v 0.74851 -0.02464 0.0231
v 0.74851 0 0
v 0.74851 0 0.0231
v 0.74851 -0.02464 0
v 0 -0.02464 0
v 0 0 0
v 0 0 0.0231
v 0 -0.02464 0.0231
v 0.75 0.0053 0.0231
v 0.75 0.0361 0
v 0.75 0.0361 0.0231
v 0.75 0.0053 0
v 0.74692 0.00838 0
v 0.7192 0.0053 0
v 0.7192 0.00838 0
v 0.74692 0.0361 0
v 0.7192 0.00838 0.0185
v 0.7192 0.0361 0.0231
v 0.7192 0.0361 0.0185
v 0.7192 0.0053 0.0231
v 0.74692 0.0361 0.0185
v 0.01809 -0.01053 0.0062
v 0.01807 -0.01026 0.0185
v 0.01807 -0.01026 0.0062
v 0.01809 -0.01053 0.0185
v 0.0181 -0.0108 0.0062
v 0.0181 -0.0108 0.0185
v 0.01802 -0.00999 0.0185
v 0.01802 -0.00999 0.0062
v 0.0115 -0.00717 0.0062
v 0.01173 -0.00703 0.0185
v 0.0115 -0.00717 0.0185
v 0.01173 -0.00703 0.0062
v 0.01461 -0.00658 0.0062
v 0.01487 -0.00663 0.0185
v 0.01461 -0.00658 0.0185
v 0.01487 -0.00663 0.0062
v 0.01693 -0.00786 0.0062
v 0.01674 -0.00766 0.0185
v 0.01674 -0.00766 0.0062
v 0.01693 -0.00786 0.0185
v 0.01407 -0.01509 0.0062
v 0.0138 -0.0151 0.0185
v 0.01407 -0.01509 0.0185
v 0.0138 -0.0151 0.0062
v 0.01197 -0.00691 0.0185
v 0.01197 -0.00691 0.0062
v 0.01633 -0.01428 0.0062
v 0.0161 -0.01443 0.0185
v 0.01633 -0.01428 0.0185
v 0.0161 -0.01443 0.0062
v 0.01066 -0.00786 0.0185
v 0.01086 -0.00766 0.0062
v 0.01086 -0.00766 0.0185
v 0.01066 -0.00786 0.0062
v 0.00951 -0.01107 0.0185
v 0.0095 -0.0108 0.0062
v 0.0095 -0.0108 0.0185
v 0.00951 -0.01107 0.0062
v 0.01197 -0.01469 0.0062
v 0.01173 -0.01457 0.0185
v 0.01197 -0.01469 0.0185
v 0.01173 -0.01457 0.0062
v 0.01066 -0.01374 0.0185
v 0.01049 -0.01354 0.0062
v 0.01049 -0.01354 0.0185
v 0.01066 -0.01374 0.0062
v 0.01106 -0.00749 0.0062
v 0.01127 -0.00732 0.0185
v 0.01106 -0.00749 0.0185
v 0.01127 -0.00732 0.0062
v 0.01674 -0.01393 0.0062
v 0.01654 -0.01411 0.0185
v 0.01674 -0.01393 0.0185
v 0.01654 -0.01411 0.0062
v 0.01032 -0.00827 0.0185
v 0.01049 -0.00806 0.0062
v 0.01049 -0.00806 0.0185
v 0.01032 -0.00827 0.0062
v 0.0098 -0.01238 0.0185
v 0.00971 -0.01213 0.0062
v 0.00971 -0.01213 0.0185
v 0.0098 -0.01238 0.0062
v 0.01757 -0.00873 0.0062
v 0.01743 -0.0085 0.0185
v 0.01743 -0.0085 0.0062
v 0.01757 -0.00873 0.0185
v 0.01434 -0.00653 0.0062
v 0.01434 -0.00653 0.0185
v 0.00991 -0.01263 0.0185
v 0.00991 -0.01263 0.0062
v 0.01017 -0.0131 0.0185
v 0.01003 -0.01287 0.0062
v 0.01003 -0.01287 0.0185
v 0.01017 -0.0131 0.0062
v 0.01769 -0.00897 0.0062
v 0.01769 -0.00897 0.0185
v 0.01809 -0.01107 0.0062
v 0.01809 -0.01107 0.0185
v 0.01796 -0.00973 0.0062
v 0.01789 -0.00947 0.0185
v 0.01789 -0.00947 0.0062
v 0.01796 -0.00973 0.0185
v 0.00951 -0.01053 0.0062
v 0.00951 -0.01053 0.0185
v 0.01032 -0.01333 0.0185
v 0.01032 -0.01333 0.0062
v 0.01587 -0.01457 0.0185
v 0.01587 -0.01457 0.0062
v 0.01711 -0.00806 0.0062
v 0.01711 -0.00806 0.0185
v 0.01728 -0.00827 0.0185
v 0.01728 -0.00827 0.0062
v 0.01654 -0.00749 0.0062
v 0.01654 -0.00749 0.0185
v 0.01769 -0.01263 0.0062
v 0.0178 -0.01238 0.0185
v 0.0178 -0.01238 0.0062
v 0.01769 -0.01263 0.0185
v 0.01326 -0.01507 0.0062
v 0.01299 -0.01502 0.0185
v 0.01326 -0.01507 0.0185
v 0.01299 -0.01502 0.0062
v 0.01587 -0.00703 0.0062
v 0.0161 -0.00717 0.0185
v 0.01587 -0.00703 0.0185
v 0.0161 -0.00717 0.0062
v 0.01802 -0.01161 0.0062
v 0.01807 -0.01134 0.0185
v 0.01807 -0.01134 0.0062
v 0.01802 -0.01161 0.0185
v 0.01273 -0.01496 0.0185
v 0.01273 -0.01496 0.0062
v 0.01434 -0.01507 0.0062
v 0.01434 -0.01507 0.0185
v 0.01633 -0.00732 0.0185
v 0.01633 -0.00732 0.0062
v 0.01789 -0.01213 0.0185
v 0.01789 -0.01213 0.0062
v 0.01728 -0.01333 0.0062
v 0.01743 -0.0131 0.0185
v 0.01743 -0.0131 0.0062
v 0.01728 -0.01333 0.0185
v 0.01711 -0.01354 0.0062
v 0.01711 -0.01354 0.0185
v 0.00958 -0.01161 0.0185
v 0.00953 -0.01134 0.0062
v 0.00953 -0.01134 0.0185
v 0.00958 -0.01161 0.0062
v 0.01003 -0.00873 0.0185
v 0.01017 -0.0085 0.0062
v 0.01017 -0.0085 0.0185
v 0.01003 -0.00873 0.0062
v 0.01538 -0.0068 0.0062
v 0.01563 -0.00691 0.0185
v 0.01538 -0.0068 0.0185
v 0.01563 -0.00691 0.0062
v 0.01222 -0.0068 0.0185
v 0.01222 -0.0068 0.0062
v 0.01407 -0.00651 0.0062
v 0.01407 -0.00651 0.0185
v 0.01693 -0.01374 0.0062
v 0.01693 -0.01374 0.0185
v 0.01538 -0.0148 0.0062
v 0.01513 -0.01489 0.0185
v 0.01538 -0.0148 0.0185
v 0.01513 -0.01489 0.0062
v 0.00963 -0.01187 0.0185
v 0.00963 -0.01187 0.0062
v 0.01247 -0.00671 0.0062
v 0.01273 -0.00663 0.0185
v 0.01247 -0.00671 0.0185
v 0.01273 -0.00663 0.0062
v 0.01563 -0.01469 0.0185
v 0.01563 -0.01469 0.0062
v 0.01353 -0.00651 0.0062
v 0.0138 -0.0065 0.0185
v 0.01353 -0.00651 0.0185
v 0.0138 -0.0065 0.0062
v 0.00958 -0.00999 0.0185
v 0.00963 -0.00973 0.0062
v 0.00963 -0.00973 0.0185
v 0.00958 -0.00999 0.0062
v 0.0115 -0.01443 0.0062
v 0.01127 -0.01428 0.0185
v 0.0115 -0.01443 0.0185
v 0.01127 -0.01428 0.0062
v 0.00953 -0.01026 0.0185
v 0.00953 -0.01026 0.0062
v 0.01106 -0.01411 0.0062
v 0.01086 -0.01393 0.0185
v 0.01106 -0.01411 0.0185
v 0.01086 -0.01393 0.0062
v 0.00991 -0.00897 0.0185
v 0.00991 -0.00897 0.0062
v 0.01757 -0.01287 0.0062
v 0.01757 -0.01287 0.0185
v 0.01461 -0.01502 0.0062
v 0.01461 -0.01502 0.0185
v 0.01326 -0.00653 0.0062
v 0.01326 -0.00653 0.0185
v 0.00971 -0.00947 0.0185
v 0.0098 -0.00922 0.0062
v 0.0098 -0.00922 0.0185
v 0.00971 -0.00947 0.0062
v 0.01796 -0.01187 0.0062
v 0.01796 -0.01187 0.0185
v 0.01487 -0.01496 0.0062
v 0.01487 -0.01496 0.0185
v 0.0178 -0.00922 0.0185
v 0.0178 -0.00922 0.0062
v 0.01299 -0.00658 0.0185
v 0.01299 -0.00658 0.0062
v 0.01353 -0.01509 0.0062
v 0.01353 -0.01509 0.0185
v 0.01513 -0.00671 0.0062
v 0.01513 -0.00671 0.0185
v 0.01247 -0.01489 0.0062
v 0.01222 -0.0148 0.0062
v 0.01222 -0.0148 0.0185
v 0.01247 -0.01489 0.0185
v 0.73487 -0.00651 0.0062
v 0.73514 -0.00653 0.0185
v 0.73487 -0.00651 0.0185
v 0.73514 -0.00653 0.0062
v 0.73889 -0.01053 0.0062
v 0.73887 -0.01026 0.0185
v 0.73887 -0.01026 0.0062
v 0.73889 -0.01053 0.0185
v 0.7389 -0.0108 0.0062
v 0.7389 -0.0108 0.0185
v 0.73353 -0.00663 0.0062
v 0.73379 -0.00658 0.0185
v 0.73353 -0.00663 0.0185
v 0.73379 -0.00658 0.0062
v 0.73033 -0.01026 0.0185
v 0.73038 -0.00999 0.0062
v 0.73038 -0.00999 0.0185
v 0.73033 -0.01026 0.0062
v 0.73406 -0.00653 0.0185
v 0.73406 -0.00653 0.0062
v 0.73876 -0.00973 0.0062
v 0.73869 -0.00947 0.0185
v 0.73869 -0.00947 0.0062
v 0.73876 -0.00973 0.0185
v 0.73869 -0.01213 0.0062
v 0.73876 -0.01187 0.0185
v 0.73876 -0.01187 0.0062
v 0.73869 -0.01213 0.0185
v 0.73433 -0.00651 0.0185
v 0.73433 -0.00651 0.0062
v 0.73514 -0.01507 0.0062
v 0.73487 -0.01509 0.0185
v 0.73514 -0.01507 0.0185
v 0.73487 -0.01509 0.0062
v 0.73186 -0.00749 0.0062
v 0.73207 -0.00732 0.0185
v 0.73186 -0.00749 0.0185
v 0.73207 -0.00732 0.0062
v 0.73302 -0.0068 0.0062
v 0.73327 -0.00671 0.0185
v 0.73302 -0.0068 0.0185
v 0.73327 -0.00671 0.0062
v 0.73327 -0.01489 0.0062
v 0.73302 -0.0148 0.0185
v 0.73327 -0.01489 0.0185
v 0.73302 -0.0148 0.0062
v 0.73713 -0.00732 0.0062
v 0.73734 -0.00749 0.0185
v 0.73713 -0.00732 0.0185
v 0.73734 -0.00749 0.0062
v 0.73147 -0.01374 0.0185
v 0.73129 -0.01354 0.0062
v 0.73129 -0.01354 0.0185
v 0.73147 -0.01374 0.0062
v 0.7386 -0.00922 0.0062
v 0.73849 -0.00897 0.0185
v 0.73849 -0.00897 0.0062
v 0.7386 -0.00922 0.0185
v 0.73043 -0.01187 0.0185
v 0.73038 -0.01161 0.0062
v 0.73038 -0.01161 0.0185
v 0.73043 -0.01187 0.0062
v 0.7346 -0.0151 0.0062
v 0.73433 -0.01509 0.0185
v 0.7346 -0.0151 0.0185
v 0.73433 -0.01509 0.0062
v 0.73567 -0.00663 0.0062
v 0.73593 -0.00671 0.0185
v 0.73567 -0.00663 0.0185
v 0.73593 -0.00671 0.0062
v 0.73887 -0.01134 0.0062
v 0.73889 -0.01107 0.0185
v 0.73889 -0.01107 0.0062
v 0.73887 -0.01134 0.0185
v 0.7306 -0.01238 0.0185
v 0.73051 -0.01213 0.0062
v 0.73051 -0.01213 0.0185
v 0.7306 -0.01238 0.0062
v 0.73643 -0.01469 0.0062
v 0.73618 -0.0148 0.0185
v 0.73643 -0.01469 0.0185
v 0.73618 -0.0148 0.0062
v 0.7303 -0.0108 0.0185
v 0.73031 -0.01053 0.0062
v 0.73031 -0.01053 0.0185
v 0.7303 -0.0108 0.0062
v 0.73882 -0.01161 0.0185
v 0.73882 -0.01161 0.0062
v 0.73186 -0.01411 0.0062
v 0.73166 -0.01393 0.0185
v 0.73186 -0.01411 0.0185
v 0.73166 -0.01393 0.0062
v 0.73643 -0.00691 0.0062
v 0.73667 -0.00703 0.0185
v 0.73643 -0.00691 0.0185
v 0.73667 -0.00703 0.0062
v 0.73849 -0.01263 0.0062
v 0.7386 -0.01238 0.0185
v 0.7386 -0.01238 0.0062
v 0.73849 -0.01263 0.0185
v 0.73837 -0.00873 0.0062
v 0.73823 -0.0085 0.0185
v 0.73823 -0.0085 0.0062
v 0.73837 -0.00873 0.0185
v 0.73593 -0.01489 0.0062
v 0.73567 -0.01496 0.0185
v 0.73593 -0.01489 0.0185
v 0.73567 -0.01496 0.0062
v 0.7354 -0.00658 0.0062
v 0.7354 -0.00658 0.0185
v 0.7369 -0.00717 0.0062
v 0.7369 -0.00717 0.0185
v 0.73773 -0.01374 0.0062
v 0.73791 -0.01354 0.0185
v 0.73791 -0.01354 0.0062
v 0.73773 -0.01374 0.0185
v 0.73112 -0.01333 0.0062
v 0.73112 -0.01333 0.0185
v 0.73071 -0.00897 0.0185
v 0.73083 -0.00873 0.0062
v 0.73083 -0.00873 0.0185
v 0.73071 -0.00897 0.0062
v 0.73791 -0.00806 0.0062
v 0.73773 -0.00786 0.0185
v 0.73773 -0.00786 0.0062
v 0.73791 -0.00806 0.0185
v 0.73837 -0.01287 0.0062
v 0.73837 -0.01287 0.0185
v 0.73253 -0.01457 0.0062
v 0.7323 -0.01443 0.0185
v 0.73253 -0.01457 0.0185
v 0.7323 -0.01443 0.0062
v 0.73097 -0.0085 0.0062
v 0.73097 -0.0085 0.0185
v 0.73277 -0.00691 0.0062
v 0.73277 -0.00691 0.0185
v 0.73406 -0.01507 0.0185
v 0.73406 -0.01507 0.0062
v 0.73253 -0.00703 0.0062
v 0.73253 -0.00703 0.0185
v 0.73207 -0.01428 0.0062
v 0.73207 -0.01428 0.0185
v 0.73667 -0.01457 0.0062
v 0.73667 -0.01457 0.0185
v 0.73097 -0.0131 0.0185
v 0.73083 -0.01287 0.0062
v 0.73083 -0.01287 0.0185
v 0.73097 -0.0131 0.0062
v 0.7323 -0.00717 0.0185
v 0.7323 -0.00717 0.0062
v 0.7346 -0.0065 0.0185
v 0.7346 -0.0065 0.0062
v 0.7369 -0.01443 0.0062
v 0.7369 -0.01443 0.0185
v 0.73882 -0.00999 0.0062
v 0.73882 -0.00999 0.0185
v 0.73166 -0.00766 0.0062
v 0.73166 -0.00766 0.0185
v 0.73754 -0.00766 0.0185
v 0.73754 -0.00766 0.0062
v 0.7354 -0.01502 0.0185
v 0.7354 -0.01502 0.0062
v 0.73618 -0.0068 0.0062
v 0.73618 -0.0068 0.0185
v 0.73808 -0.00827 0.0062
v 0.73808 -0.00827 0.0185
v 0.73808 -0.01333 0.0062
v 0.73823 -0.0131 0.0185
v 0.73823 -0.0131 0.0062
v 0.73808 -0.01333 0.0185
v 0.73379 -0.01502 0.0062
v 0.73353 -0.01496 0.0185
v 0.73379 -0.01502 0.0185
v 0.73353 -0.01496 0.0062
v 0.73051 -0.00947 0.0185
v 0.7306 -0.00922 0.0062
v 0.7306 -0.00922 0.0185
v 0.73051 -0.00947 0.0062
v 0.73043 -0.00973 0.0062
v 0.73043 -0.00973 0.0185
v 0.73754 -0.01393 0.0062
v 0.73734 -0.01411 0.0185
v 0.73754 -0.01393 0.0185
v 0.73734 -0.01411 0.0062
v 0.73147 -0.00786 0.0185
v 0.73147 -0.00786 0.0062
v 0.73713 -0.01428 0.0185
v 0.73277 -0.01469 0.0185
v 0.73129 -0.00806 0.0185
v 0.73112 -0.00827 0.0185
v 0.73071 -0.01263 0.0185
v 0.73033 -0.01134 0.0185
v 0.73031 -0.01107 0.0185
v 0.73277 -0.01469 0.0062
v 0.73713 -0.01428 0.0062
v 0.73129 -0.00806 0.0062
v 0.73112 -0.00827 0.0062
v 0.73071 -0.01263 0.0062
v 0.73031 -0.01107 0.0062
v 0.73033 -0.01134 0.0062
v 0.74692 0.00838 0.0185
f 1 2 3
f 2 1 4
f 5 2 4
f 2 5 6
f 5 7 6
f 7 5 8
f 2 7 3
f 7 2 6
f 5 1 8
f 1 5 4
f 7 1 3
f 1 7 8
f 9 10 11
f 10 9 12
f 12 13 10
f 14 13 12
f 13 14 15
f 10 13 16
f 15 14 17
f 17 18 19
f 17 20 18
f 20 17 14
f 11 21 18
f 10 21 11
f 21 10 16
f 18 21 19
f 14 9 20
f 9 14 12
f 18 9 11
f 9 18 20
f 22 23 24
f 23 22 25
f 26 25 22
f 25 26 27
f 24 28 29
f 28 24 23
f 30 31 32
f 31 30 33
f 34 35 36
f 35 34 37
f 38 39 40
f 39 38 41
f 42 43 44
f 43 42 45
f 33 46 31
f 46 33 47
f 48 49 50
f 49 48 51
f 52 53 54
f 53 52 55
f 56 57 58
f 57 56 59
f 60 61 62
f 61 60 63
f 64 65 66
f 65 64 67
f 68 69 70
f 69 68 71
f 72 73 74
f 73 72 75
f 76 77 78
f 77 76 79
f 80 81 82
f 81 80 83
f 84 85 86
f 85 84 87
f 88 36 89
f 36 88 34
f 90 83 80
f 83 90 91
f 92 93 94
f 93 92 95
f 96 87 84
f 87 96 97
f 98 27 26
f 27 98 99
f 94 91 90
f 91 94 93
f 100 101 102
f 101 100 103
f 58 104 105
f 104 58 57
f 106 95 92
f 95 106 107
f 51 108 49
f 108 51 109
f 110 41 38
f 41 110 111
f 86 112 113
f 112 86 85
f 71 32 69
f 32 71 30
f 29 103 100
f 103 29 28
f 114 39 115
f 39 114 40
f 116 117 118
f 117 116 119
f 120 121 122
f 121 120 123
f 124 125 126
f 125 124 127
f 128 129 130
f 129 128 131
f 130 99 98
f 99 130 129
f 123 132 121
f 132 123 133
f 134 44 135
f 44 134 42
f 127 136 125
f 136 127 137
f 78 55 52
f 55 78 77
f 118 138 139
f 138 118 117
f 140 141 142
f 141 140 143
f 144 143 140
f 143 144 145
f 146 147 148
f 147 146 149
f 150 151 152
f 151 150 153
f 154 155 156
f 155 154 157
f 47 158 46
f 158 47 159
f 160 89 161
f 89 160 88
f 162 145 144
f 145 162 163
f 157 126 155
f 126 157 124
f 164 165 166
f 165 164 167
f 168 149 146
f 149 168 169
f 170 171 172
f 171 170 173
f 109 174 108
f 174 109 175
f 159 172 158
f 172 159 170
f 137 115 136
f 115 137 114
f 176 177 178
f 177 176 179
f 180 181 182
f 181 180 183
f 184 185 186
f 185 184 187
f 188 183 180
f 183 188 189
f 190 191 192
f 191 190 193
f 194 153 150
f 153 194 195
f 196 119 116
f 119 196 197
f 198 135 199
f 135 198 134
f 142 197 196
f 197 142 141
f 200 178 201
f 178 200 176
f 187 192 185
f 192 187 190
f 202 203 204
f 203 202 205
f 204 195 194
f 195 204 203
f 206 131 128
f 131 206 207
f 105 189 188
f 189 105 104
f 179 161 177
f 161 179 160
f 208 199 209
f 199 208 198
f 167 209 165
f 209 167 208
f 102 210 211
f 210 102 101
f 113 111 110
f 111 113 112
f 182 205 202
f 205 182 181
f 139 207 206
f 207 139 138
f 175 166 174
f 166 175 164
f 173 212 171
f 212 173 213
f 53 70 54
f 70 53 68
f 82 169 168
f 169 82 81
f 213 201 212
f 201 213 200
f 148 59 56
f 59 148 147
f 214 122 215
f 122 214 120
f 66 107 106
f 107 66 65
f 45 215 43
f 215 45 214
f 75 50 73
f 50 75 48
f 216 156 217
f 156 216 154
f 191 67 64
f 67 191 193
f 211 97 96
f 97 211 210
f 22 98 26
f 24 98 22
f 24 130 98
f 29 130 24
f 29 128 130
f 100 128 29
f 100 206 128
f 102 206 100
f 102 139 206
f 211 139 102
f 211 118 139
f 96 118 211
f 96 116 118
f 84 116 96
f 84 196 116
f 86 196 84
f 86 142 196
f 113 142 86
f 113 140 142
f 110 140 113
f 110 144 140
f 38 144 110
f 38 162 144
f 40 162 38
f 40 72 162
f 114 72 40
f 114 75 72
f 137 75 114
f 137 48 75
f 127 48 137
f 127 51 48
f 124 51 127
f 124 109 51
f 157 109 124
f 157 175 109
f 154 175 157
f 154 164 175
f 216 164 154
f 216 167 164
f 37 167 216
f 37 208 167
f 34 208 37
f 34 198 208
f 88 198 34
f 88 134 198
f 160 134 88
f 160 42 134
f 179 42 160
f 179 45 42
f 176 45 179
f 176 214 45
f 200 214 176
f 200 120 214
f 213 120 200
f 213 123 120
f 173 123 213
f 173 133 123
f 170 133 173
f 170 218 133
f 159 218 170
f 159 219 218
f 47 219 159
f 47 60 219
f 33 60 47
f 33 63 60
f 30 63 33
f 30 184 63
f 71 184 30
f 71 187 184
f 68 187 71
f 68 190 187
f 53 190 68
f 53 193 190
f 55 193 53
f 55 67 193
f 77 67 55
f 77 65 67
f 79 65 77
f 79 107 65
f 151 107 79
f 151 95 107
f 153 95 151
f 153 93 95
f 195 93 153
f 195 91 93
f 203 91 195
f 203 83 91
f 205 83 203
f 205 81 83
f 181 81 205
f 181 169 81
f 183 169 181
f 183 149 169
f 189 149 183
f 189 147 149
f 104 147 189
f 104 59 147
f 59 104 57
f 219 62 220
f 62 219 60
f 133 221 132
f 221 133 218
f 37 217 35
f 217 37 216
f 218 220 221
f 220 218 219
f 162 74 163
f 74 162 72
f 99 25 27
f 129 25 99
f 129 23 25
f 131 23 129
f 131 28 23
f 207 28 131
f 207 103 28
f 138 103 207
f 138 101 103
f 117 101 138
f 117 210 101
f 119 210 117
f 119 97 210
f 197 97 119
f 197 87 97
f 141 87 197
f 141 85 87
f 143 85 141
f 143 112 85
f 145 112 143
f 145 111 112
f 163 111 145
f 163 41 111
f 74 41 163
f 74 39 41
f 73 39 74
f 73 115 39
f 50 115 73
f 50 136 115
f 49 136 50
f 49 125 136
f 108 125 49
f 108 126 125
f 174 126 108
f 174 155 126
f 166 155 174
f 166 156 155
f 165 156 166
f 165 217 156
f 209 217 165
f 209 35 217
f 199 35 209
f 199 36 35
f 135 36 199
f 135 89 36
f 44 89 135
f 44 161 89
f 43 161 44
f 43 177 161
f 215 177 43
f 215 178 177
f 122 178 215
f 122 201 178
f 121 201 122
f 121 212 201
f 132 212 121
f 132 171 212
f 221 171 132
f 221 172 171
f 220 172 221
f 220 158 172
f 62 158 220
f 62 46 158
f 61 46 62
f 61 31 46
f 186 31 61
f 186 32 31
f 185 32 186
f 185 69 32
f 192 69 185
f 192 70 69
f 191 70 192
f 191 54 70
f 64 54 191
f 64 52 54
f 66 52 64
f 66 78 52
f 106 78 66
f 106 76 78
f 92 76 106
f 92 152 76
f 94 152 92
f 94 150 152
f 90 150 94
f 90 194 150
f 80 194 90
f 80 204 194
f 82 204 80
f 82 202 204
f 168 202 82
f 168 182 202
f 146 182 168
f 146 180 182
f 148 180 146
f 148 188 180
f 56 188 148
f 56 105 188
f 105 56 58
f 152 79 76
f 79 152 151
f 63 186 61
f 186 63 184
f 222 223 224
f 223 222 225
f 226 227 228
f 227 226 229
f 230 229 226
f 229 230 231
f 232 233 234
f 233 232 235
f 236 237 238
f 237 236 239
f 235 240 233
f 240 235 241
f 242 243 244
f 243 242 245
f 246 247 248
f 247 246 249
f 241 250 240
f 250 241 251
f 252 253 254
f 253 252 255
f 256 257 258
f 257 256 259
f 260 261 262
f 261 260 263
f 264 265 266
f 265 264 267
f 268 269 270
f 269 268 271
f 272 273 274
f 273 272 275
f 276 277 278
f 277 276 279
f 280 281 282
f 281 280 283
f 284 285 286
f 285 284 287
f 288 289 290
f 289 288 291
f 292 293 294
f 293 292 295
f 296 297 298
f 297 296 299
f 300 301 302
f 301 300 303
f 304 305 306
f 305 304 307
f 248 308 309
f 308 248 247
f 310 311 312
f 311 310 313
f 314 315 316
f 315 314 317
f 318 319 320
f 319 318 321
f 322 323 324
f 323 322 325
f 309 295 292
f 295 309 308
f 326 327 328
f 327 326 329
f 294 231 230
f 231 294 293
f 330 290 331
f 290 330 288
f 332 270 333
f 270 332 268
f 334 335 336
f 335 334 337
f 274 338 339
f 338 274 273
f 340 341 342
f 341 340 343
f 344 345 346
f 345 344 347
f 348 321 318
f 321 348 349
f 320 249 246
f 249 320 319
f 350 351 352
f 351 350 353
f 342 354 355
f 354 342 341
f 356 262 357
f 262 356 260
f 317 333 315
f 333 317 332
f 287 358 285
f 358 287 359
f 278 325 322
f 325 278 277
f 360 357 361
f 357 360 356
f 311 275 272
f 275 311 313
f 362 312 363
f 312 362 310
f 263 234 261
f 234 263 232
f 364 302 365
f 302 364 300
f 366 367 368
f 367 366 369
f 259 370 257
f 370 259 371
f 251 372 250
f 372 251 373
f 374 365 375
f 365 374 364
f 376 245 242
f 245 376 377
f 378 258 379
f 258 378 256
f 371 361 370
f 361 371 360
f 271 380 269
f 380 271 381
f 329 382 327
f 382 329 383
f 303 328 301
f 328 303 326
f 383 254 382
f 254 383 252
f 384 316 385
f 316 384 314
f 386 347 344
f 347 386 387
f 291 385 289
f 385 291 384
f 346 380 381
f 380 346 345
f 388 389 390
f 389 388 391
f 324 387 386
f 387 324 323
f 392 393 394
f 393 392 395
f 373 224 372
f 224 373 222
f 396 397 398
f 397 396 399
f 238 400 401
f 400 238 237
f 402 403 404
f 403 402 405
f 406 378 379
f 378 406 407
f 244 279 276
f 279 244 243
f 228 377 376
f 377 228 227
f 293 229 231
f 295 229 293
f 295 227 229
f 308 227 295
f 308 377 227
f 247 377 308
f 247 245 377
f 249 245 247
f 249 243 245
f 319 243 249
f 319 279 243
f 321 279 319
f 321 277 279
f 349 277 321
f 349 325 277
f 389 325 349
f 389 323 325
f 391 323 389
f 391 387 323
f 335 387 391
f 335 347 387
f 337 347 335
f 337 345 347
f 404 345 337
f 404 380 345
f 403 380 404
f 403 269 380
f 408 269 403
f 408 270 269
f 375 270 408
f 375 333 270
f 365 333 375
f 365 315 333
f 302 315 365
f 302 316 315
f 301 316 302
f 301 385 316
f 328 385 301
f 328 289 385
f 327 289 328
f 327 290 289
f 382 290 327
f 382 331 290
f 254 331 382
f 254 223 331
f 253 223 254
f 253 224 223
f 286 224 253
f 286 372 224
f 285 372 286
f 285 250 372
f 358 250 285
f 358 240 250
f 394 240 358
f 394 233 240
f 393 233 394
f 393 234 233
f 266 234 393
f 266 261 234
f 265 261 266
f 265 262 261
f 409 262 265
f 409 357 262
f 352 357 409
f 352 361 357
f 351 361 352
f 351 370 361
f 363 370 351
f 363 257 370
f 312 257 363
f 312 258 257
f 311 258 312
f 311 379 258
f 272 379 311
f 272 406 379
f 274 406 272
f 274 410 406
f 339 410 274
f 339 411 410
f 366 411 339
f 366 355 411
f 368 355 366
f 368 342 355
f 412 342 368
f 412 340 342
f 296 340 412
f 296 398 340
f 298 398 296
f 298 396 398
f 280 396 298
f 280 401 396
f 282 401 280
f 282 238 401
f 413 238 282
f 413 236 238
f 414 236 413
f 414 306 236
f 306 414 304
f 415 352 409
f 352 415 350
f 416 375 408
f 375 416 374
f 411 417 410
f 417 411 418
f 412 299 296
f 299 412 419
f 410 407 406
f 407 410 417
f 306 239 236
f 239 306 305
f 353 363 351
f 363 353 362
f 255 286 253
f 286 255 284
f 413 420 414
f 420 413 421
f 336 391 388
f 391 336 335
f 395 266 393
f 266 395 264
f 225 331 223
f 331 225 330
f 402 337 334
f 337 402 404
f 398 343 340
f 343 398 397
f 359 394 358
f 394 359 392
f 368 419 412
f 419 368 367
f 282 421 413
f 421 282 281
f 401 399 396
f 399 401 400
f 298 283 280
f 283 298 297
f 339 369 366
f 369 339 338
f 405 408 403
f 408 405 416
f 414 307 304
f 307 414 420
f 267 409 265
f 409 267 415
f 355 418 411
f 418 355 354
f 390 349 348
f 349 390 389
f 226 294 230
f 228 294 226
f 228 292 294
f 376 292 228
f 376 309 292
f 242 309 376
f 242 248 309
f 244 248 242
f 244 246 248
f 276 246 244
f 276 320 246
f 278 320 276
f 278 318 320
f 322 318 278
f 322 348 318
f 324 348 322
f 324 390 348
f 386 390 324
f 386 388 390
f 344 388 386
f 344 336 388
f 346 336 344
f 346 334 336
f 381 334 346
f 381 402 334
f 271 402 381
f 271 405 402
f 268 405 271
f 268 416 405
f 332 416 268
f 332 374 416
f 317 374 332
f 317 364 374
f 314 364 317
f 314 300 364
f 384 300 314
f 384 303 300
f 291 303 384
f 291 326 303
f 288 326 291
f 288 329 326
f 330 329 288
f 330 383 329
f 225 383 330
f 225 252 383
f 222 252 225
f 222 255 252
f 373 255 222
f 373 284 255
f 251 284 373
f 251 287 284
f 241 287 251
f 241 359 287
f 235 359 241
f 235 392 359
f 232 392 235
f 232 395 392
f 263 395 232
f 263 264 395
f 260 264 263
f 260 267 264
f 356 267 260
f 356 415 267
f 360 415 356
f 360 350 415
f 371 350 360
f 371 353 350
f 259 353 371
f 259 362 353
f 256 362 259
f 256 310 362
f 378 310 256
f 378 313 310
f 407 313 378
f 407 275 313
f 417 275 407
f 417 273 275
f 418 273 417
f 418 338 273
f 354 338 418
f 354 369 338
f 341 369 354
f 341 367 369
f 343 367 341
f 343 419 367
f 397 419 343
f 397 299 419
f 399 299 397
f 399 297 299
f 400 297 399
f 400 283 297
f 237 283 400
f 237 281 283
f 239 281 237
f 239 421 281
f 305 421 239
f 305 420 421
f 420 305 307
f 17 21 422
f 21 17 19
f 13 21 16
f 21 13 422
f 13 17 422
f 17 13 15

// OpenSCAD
// Parametric CAD model

// ------ Base dimensions ------
rail_length = 0.748506;
rail_width  = 0.024642;
lower_height = 0.0185;          // lower solid body height
top_thickness = 0.0046;         // shallow top layer thickness, raising surface to Z=0.0231

// ------ End block ------
block_side = 0.030803;
block_left_x = 0.7192;          // ~0.0015 beyond rail right end
block_front_y = 0.0361;         // in front of rail front edge
block_back_y  = block_front_y - block_side; // 0.005297

// ------ Rail edge references ------
rail_front_y = 0;
rail_back_y  = -rail_width;

// ------ Circular recesses (in rail) ------
recess_radius = 0.0043;
recess_zmin   = 0.0062;         // start height above base underside
recess_height = 0.0123;         // band depth, ends exactly at Z = lower_height

rail_center_y = -0.0108;        // common Y offset from rail front edge
rail_cx1      = 0.0138;         // first recess center X (from left end)
rail_cx2      = 0.7346;         // second recess center X

// ------ Circular recess (in end block) ------
block_cyl_cx = 0.7361;
block_cyl_cy = 0.0192;          // in front of rail front edge

// ------ Deep rectangular cutout (in end block) ------
cutout_side = 0.027722;
cutout_left_x = block_left_x;   // shares block left edge
cutout_front_y = block_front_y; // shares block front edge
cutout_back_y = cutout_front_y - cutout_side; // 0.008378
cutout_zmin   = -0.0585;        // goes below base underside
cutout_zmax   = lower_height;   // starts from lower-body shoulder

// ------ Resolution ------
$fn = 100;

// ------ Main geometry ------
difference() {
    union() {
        // Rail lower body
        translate([0, rail_back_y, 0])
            cube([rail_length, rail_width, lower_height]);
        // Rail top layer (same footprint)
        translate([0, rail_back_y, lower_height])
            cube([rail_length, rail_width, top_thickness]);

        // End block lower body
        translate([block_left_x, block_back_y, 0])
            cube([block_side, block_side, lower_height]);
        // End block top layer
        translate([block_left_x, block_back_y, lower_height])
            cube([block_side, block_side, top_thickness]);
    }

    // Two circular recesses inside the rail
    translate([rail_cx1, rail_center_y, recess_zmin])
        cylinder(h = recess_height, r = recess_radius);
    translate([rail_cx2, rail_center_y, recess_zmin])
        cylinder(h = recess_height, r = recess_radius);

    // Circular recess inside the end block
    translate([block_cyl_cx, block_cyl_cy, recess_zmin])
        cylinder(h = recess_height, r = recess_radius);

    // Deep rectangular cutout at the block's left-front corner
    translate([cutout_left_x, cutout_back_y, cutout_zmin])
        cube([cutout_side, cutout_side, cutout_zmax - cutout_zmin]);
}
